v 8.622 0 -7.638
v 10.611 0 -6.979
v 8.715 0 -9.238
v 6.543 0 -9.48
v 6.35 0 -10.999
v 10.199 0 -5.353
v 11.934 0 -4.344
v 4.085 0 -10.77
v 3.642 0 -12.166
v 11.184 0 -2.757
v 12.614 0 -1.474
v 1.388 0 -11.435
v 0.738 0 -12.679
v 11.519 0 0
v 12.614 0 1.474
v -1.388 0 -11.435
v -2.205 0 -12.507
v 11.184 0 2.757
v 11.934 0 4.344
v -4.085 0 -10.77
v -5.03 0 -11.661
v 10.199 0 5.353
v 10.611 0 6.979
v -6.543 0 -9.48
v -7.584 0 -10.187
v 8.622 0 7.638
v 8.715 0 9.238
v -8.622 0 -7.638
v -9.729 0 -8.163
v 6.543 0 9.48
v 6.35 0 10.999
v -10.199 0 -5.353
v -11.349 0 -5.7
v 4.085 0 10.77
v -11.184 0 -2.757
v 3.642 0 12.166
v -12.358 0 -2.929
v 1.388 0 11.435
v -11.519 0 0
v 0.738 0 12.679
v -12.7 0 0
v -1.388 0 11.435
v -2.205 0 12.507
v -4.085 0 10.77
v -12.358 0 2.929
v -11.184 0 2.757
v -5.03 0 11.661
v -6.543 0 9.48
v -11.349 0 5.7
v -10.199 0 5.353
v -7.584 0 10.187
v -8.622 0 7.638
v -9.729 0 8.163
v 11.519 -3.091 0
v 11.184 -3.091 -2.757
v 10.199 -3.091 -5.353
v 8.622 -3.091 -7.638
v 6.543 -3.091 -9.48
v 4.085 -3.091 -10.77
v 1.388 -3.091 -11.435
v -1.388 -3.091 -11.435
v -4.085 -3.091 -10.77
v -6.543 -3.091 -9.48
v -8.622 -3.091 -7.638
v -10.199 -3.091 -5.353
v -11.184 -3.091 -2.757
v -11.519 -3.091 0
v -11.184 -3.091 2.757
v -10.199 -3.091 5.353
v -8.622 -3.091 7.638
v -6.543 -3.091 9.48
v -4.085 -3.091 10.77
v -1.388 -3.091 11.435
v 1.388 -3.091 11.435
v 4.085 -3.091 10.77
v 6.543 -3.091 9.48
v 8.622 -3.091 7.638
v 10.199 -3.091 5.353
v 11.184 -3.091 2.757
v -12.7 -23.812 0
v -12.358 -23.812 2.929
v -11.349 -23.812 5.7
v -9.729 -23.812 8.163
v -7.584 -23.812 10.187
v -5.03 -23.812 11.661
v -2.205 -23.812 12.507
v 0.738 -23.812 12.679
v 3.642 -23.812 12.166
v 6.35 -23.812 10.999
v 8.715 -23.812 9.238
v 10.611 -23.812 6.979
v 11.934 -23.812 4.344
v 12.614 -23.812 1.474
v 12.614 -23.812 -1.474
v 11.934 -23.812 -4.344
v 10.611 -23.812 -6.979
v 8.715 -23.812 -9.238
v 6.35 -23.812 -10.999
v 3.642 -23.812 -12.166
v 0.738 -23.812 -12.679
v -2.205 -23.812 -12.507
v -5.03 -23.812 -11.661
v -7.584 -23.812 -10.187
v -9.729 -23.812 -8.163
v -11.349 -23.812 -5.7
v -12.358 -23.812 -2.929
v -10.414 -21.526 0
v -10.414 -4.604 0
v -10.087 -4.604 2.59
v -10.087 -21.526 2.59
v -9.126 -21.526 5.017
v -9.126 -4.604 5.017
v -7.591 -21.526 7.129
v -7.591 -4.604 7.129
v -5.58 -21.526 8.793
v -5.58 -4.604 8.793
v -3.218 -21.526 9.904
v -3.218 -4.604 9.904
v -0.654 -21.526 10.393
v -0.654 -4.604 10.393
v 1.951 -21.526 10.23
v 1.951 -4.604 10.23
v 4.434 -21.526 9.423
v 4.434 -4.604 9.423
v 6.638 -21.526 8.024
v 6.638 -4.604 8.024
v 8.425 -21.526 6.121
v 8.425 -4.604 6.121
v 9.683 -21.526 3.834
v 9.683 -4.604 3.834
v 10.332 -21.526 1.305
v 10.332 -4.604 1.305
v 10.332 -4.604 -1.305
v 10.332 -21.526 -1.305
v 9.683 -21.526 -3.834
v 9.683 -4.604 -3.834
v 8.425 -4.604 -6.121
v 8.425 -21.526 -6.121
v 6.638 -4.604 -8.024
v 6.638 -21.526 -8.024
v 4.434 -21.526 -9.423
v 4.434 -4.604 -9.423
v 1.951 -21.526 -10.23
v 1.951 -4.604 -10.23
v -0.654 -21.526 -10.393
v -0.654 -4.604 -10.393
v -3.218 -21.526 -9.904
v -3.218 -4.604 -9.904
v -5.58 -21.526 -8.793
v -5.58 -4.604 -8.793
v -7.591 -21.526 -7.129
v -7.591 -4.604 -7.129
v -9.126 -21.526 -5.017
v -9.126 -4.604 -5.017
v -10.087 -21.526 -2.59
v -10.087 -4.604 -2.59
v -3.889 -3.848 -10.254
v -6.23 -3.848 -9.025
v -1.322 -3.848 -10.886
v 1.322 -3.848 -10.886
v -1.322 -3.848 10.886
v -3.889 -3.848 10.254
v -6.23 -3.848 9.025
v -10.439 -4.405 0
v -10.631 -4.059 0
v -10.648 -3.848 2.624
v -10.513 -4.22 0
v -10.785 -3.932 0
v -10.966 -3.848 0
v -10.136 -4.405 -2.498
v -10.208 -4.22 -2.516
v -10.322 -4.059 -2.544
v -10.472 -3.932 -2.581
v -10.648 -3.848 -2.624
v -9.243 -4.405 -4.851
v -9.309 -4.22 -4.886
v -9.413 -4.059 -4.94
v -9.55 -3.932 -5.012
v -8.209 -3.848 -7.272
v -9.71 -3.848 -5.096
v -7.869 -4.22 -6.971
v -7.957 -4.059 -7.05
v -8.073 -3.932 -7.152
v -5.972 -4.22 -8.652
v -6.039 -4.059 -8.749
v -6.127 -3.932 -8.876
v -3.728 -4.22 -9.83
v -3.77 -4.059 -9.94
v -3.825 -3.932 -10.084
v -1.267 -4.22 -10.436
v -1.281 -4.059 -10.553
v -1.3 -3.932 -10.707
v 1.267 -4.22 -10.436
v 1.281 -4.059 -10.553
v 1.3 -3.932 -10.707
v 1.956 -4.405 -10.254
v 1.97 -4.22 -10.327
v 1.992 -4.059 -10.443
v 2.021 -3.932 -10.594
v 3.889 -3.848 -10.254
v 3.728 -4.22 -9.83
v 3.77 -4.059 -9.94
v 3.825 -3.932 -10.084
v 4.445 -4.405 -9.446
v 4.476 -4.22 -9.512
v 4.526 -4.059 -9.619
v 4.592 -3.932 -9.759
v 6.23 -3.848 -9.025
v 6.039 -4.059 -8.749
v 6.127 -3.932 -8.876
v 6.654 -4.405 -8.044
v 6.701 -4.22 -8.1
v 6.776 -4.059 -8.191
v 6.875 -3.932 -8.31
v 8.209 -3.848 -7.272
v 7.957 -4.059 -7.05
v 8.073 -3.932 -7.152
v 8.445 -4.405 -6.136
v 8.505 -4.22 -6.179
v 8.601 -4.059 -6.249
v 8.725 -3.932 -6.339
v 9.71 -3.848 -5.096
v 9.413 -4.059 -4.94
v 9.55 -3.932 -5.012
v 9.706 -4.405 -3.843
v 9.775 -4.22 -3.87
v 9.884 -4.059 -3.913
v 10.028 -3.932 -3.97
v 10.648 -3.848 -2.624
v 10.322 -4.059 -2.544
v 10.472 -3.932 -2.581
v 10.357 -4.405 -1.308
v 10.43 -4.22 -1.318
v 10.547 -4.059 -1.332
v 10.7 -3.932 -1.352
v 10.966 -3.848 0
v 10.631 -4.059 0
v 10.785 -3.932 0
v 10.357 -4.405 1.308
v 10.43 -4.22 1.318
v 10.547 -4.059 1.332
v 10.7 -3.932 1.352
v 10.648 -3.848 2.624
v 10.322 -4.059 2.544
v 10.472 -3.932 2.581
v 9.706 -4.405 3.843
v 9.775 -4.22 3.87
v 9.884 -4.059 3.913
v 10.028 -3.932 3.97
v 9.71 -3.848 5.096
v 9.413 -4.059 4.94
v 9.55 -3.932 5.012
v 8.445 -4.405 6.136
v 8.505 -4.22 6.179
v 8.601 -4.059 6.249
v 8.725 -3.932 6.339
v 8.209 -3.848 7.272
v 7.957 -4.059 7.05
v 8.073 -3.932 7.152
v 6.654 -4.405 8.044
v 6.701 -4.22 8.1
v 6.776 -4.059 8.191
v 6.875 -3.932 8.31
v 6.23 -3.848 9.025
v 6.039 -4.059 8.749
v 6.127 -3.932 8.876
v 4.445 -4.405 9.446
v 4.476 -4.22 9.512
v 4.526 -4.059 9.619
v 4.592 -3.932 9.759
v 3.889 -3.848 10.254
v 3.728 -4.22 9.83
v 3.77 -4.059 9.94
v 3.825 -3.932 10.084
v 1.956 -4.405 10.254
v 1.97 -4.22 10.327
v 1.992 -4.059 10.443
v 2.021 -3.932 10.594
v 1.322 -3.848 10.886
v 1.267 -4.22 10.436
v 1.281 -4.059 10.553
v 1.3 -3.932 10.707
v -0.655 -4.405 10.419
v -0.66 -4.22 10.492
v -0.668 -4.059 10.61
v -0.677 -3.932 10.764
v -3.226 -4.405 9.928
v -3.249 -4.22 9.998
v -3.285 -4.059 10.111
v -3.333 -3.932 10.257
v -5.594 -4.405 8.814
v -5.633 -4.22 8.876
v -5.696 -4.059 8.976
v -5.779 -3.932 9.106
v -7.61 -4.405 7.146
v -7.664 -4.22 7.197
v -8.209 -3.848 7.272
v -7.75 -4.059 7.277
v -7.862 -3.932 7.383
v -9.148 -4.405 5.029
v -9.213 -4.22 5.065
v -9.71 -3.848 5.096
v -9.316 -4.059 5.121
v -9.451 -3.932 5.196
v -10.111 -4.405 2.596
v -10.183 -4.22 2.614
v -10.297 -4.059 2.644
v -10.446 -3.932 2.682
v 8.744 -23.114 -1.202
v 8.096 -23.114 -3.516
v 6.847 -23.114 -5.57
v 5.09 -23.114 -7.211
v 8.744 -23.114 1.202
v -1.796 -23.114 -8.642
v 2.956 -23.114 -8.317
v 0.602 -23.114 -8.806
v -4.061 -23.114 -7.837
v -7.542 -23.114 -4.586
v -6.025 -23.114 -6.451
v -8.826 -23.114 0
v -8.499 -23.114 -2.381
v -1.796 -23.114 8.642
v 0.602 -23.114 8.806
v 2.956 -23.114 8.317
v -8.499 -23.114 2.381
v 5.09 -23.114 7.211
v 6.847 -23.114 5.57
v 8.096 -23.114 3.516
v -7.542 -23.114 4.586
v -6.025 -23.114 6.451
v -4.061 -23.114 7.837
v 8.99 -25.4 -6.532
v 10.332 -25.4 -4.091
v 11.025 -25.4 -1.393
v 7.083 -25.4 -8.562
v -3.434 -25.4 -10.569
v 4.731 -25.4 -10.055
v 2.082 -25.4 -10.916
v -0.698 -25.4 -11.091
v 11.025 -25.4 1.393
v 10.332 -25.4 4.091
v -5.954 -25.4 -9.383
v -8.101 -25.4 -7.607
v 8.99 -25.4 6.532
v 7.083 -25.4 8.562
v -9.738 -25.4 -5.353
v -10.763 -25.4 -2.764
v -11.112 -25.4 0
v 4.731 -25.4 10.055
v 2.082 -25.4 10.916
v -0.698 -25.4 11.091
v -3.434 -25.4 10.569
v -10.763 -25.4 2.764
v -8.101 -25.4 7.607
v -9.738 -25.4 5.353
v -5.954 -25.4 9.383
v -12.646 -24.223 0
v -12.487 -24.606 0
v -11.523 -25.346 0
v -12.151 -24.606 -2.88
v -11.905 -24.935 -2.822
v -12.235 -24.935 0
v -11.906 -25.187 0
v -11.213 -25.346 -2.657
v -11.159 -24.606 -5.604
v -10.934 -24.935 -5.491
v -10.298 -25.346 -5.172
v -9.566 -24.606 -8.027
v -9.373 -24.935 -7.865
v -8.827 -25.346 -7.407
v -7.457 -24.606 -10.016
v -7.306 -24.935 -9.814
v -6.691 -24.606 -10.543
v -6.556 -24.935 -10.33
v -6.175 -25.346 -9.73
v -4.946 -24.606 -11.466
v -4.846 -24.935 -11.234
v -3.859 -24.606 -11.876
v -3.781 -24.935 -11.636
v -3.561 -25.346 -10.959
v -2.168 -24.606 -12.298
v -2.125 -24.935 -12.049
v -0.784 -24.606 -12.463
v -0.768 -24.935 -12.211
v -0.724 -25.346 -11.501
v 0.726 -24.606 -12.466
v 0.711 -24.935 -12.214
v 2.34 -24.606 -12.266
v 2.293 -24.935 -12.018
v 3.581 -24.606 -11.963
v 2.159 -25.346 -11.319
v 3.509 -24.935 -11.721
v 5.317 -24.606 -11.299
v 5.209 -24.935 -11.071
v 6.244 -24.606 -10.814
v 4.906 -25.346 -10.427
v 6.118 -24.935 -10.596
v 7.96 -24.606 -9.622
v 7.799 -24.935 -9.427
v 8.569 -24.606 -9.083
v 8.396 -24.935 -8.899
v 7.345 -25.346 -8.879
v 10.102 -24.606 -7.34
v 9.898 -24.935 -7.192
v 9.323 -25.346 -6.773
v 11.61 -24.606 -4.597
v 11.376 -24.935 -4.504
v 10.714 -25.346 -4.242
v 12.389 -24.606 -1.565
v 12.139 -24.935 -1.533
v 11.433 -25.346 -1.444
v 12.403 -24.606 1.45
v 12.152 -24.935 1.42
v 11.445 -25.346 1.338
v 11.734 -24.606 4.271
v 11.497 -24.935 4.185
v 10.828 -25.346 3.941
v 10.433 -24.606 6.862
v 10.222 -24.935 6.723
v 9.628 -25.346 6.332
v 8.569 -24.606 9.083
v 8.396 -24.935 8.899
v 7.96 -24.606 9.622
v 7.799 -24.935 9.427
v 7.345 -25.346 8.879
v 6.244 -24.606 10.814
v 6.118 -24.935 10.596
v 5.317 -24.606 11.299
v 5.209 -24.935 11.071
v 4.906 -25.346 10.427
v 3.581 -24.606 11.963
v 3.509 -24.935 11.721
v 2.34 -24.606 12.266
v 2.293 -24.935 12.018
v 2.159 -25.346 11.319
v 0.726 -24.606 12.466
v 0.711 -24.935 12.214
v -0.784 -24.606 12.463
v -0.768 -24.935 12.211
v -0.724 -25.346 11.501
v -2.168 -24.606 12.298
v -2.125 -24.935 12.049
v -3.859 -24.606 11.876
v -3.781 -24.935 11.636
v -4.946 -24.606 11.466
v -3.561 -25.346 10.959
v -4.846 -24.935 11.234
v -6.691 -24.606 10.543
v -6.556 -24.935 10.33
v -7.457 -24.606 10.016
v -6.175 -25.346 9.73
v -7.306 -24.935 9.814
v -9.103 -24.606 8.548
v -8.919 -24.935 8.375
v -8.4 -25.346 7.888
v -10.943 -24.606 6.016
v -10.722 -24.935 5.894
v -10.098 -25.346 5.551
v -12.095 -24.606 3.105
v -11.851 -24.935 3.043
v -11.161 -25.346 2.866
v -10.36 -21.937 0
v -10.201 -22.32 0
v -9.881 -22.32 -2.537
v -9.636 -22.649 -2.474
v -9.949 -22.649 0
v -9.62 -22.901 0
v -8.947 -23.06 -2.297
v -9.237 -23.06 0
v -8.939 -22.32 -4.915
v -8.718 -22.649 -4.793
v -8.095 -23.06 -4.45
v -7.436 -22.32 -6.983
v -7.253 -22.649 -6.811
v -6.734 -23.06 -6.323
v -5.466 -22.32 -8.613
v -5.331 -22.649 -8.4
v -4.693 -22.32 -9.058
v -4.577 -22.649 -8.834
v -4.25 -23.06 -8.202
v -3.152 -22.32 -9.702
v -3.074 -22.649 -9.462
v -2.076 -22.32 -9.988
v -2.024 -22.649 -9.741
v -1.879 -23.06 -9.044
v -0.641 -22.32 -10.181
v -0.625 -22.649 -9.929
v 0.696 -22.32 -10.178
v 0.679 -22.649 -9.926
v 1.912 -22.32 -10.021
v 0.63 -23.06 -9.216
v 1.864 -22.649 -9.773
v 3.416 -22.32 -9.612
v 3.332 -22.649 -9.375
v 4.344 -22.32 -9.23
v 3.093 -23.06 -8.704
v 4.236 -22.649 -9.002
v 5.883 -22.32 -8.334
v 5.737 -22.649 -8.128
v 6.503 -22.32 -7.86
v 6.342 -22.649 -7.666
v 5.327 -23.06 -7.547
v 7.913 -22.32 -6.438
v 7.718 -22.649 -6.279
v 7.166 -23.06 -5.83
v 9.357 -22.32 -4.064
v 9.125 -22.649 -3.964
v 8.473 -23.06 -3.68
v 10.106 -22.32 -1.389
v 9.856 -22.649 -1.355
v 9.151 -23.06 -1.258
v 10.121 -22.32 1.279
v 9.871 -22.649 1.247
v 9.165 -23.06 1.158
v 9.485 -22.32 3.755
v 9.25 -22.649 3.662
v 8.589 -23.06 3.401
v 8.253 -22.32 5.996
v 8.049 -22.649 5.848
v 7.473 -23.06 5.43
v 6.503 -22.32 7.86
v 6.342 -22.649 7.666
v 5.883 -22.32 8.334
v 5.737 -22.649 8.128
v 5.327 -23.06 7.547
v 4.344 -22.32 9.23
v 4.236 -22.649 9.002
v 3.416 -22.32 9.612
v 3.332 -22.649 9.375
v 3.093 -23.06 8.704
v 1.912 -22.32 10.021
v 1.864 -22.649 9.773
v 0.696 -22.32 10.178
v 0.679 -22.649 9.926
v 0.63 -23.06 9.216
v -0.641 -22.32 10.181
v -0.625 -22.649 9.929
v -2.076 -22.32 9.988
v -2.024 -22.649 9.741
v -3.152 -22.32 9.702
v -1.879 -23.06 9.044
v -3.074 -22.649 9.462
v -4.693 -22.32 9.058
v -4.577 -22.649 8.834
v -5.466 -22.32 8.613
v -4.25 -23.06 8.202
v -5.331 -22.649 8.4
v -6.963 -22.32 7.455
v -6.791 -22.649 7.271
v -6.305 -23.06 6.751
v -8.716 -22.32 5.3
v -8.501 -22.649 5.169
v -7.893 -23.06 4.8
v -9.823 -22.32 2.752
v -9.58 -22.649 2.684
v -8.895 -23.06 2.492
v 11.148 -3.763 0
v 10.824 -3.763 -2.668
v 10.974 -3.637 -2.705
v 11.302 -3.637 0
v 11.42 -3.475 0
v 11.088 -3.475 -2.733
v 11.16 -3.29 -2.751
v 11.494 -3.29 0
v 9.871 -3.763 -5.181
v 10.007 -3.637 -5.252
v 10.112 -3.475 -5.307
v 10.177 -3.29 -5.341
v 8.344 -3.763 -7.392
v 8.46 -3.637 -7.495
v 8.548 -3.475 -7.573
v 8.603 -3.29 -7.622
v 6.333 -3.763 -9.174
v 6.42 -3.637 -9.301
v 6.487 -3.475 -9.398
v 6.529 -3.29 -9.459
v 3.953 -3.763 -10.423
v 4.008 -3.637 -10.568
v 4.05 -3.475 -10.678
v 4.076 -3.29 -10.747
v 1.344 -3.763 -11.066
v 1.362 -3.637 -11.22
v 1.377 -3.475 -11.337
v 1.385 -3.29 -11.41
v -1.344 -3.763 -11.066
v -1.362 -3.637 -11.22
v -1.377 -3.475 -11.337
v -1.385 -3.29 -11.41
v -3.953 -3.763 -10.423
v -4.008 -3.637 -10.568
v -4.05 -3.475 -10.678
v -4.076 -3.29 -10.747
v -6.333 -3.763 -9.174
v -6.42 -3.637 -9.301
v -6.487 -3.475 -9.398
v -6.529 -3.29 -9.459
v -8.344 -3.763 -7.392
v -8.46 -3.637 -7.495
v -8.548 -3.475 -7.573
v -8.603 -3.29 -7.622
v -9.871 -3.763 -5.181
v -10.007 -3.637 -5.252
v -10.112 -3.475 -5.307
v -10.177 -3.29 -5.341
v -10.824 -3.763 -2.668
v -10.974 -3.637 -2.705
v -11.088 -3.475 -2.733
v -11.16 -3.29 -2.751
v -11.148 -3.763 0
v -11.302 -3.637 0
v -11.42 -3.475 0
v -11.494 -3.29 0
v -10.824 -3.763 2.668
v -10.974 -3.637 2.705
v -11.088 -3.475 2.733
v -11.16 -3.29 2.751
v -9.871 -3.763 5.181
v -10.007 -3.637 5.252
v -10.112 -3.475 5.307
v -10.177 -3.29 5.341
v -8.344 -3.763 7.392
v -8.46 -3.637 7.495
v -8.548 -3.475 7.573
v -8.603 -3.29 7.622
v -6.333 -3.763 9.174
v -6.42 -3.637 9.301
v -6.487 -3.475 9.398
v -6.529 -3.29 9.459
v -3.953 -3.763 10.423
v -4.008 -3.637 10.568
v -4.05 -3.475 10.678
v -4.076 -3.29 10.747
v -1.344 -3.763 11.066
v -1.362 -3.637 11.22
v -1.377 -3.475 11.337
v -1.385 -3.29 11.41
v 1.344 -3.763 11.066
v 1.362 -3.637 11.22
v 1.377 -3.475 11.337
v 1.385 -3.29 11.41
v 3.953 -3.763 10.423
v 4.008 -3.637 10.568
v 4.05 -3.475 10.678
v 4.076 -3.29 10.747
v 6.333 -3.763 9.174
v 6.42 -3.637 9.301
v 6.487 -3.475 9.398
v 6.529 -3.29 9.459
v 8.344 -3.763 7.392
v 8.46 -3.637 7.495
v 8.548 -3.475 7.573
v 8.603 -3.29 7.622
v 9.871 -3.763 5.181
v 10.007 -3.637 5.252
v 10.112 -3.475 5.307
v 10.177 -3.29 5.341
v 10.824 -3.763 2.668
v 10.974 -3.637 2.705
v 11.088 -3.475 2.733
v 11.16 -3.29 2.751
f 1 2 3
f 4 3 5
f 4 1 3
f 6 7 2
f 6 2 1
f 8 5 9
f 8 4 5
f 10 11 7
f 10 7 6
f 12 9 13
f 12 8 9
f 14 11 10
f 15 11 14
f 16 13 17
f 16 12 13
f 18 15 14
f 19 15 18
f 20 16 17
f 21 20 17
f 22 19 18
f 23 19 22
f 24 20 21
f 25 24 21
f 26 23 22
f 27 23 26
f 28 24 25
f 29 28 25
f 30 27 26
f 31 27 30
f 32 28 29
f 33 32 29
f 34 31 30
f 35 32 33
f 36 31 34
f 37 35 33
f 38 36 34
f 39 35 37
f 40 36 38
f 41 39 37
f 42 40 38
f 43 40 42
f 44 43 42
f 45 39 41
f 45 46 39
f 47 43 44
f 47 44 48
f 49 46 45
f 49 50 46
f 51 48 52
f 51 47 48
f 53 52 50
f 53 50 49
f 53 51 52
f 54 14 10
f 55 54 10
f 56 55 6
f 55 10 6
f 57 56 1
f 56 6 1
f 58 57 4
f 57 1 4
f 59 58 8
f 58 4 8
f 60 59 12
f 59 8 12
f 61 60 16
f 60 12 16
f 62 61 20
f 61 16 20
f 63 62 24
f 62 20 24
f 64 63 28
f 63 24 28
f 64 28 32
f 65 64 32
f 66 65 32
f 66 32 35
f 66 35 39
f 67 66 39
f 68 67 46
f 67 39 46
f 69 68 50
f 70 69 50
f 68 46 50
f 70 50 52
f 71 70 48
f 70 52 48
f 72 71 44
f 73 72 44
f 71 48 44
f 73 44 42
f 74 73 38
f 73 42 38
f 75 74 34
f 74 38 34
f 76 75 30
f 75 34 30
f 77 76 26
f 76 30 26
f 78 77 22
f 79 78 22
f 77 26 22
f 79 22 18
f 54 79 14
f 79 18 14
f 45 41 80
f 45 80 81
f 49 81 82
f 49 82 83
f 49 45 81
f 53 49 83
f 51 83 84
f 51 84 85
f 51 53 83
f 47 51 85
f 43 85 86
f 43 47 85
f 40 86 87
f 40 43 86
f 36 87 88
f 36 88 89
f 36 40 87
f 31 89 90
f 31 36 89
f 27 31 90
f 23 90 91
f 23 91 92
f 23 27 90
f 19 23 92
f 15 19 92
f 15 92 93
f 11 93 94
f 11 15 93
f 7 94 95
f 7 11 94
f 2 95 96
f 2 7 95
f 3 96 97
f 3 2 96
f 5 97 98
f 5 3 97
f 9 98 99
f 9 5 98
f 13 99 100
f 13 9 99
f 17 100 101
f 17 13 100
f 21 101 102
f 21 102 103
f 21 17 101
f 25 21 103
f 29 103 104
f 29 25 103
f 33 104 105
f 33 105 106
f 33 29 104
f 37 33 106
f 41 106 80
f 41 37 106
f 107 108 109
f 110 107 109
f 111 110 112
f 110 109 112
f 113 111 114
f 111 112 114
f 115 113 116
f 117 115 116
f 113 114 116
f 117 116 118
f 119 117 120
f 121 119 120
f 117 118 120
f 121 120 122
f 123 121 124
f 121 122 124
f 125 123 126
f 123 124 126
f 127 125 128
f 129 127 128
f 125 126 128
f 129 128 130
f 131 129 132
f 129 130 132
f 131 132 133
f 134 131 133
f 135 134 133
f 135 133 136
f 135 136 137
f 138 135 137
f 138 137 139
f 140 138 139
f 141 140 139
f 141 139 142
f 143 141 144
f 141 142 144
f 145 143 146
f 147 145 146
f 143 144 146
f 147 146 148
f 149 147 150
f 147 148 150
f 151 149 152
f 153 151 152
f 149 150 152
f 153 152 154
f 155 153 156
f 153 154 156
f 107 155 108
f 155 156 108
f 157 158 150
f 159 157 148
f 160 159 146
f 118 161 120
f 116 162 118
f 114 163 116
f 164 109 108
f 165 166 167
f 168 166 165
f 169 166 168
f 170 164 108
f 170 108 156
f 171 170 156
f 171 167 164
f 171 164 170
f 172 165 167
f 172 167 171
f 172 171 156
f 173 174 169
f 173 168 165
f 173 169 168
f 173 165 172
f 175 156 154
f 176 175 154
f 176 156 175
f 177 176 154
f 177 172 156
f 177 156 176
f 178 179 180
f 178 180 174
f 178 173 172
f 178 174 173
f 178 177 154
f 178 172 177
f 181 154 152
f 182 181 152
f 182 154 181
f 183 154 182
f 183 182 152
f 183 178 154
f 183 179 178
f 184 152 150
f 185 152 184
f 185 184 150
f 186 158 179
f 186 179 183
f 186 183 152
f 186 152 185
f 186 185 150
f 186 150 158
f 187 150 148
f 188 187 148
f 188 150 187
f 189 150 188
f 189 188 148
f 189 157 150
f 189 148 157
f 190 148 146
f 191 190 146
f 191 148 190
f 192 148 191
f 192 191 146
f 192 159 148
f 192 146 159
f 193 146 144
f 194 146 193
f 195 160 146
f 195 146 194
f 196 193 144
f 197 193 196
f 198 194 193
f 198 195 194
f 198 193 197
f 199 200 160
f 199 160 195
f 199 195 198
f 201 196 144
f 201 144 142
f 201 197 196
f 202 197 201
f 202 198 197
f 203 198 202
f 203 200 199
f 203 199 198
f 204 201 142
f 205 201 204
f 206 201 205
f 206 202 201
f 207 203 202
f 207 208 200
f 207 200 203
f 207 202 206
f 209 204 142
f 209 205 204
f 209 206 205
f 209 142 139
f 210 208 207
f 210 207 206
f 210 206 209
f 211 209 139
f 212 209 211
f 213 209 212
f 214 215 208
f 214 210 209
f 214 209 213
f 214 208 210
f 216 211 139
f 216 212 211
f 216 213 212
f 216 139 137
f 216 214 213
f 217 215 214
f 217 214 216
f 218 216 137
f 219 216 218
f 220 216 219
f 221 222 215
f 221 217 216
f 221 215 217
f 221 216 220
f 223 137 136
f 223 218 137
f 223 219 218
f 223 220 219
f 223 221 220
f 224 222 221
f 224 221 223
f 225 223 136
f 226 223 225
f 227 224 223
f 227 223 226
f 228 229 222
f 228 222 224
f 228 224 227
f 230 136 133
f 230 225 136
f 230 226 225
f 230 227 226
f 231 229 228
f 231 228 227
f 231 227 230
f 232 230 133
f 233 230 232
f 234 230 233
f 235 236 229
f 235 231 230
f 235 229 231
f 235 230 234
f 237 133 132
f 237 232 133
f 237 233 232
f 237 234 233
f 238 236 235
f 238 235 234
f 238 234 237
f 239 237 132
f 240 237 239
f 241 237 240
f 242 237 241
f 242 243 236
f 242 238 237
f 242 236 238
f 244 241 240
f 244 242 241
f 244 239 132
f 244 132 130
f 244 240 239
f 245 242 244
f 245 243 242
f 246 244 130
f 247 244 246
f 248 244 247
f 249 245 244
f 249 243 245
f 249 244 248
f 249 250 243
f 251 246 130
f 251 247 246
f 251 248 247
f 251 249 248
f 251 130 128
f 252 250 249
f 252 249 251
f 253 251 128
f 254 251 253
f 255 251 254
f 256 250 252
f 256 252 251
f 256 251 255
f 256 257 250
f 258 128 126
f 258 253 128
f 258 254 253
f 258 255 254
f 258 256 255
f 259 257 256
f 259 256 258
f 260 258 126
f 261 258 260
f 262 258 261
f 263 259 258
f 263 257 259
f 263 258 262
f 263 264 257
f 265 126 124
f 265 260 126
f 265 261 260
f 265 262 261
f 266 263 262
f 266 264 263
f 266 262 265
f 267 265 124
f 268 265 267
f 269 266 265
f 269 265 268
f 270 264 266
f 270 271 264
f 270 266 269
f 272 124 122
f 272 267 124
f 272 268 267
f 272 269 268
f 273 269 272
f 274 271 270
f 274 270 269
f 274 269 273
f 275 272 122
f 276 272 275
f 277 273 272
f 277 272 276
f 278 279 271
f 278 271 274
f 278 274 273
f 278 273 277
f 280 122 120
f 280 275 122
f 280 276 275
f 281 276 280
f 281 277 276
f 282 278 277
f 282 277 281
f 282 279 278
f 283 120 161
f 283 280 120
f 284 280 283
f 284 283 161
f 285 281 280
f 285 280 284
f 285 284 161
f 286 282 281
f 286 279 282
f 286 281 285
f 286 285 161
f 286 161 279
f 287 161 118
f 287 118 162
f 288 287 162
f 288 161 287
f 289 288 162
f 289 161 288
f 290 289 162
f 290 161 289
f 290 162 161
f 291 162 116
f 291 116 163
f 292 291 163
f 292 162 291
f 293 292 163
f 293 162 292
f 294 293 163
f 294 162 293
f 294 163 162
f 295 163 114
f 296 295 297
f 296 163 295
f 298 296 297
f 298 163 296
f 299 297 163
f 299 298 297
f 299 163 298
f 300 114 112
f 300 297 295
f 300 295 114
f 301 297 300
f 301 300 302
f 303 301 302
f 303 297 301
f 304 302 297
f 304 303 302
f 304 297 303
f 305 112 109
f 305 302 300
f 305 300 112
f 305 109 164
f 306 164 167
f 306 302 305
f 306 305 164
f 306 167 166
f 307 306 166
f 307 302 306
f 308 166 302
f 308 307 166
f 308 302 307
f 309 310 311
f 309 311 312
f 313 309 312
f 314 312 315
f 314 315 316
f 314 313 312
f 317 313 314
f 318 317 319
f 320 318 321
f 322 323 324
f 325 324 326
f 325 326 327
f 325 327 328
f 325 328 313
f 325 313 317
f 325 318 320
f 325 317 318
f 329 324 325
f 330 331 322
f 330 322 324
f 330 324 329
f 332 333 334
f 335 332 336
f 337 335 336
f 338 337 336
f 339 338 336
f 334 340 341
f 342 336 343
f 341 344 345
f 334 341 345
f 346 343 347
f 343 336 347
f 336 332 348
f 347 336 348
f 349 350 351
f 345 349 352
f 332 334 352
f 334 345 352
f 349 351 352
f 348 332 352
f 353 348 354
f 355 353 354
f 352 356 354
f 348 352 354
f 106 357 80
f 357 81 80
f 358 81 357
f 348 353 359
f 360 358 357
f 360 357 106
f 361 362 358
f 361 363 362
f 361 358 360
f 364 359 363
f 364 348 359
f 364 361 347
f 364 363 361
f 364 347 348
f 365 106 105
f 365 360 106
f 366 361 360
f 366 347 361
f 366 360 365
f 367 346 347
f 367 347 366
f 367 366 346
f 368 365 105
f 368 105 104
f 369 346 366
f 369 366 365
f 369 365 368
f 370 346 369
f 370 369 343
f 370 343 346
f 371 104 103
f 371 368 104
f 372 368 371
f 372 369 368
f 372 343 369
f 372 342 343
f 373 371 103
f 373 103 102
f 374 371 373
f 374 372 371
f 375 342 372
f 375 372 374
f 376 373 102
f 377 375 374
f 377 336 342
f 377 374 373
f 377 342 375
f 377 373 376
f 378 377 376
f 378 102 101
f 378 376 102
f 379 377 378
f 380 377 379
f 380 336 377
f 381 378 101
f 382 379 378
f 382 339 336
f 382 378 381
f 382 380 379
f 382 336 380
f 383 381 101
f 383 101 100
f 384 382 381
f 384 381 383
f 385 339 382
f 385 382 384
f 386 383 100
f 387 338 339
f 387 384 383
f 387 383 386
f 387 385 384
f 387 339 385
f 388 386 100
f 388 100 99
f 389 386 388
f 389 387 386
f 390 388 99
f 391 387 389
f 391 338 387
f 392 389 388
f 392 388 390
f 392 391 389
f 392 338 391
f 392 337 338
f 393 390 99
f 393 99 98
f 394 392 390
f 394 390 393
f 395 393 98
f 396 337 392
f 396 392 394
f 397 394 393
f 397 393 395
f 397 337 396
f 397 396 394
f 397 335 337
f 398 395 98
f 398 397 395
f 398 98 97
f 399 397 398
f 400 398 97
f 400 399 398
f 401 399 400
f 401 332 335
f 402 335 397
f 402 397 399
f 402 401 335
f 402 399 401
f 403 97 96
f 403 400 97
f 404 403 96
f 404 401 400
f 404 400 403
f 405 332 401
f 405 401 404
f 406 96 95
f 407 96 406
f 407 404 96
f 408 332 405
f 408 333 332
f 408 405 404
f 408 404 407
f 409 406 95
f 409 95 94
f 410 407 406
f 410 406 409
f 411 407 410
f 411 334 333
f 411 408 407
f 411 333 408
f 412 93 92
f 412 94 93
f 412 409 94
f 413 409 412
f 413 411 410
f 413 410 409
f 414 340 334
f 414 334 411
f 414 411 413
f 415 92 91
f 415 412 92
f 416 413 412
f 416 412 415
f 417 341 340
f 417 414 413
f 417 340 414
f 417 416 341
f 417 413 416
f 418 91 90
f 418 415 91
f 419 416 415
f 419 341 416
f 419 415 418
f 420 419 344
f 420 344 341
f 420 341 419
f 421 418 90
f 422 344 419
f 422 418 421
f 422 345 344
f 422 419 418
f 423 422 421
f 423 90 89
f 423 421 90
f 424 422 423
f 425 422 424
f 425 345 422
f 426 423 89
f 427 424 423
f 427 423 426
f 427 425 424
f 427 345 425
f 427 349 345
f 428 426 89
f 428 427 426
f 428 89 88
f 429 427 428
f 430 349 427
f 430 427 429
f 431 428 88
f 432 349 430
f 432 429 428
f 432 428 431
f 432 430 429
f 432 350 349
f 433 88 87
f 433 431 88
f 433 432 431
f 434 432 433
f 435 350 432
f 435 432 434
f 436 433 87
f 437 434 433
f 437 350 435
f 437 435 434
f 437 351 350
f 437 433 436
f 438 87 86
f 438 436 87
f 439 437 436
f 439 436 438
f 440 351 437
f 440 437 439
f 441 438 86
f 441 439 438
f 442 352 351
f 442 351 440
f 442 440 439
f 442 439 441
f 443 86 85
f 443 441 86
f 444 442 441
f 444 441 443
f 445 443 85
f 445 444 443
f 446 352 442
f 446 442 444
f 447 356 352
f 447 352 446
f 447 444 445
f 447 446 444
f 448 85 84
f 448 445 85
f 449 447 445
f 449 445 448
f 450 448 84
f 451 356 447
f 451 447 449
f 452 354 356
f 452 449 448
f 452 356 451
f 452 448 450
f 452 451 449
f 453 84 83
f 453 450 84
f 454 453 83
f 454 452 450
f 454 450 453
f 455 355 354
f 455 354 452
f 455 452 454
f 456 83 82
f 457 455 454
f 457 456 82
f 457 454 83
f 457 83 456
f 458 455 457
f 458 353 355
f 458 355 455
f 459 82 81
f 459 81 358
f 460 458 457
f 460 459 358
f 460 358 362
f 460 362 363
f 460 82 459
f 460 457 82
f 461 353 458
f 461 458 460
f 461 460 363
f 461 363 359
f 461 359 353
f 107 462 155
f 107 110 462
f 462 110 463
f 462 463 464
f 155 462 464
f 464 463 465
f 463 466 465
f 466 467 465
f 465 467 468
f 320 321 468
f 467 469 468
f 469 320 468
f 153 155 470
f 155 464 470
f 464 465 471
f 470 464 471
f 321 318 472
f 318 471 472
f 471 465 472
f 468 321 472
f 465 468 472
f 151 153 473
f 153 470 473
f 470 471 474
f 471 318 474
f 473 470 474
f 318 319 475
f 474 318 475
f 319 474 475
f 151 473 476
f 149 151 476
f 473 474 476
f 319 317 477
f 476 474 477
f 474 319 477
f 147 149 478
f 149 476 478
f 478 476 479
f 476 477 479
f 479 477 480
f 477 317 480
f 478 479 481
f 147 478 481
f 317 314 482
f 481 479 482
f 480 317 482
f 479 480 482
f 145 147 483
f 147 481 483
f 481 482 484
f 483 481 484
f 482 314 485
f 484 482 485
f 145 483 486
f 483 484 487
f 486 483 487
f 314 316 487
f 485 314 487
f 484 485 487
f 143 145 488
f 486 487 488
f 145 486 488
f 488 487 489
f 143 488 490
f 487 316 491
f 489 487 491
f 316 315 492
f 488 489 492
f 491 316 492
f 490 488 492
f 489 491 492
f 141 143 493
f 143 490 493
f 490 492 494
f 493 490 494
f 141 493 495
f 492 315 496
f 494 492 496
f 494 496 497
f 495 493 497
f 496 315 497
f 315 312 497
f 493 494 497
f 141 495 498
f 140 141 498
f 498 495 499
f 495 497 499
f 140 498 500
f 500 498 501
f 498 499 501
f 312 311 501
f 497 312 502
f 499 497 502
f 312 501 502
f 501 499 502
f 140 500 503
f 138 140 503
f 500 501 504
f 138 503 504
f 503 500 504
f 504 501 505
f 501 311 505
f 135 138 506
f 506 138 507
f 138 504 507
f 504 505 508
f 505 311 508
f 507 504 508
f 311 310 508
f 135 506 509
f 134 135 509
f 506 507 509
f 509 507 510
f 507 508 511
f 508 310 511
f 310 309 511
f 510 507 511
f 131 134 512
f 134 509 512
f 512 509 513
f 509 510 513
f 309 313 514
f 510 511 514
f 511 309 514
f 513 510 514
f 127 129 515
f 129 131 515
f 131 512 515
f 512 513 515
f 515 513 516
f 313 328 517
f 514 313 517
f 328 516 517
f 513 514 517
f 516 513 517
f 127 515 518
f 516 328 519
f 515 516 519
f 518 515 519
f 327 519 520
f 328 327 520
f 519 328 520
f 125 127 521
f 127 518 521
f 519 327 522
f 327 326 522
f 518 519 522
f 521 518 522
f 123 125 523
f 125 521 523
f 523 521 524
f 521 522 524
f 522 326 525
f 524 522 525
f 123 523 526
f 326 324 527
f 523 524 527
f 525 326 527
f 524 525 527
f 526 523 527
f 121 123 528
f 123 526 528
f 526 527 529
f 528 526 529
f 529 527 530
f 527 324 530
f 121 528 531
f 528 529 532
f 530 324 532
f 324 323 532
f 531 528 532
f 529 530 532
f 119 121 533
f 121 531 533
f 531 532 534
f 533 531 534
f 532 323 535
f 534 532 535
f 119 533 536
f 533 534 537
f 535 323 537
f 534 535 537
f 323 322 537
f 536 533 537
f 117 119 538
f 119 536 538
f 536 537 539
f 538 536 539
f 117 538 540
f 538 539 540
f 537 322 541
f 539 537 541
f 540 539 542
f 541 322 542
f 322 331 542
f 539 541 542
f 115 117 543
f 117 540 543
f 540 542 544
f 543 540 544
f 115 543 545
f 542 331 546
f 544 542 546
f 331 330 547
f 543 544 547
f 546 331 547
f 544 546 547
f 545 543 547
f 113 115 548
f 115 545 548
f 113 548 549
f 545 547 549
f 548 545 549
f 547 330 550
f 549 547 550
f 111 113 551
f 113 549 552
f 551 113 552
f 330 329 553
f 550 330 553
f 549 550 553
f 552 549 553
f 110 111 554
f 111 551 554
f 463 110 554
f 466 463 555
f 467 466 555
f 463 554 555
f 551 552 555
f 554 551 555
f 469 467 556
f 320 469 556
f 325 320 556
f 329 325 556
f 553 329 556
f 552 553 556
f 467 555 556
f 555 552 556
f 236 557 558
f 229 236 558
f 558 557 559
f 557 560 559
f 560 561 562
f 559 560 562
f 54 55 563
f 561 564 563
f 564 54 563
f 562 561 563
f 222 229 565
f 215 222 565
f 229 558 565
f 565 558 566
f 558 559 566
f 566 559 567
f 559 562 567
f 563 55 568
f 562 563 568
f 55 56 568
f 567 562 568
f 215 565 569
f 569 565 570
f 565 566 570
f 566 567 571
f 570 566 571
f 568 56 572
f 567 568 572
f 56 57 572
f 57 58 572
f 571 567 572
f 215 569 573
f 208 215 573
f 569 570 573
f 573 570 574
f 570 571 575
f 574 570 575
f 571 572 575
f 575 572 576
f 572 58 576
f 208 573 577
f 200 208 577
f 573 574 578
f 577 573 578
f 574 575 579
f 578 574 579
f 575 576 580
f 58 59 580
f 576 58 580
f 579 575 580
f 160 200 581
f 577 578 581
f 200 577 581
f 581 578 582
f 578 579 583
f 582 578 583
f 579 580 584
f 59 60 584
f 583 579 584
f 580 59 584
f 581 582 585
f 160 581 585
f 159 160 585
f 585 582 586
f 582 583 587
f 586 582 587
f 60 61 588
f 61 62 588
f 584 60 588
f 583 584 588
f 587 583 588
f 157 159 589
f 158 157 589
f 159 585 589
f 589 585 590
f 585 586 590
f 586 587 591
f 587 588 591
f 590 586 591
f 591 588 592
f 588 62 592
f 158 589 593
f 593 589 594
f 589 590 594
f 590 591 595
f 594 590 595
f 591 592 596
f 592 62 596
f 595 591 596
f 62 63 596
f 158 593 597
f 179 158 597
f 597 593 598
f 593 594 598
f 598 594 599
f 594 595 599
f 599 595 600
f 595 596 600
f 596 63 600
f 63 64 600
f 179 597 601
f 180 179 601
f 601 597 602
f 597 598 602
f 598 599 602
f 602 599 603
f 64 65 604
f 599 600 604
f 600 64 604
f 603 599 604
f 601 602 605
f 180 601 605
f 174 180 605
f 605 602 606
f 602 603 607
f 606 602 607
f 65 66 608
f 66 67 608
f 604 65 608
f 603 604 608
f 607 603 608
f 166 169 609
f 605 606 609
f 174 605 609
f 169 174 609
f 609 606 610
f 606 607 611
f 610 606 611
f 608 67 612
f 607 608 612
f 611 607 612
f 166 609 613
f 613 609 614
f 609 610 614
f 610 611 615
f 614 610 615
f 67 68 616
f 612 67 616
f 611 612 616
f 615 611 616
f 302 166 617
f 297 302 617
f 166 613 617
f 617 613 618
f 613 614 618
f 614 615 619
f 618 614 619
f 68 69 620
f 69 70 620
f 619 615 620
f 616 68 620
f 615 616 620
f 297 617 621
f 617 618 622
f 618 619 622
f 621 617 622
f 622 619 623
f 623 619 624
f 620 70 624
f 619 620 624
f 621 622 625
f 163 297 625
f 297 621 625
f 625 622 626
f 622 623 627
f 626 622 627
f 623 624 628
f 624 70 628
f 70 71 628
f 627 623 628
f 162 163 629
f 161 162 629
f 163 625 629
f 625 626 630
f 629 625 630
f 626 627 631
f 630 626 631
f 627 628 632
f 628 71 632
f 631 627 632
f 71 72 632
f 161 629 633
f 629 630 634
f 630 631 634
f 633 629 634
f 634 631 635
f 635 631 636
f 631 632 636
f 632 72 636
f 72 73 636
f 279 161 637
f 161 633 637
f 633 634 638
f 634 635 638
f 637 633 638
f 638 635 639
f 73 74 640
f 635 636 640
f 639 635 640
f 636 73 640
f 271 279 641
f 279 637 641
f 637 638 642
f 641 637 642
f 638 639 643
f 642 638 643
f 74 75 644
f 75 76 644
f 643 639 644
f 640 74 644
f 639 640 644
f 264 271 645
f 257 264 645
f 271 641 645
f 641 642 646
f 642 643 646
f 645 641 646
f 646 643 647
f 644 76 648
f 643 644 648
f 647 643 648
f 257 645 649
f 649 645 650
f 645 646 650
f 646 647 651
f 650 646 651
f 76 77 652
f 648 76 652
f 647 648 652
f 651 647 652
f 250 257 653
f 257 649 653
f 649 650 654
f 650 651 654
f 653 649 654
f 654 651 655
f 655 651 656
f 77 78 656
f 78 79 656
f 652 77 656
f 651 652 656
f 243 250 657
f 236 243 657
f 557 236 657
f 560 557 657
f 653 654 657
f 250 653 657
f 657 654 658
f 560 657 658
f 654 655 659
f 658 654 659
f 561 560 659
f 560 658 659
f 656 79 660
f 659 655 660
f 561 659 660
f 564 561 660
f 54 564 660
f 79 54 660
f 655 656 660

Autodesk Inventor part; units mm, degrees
ref_plane "YZ Plane" through (0, 0, 0) normal (1, 0, 0) x (0, 1, 0)
ref_plane "XZ Plane" through (0, 0, 0) normal (0, 1, 0) x (-1, 0, 0)
ref_plane "XY Plane" through (0, 0, 0) normal (0, 0, 1) x (1, 0, 0)
sketch "Sketch1" plane through (0, 0, 0) normal (0, 1, 0) x (-1, 0, 0)
  circle A0 centre (0, 0) radius 12.7
  dimension "d1" = 25.4
extrude "Extrusion1" add sketch "Sketch1" against normal blind 25.4
shell "Shell1" thickness 2.286 removed faces 1 at (-0.1664, 0, 2.8072)
sketch "Sketch2" plane through (0, 0, 0) normal (0, 1, 0) x (1, 0, 0)
  circle A0 centre (0, 0) radius 11.5189
  dimension "d5" = 23.0378
extrude "Extrusion2" cut sketch "Sketch2" against normal blind 3.81
fillet "Fillet1" radius 1.5875 1 edges at (12.7, -25.4, 0)
fillet "Fillet2" radius 1.5875 1 edges at (10.414, -23.114, 0)
fillet "Fillet3" radius 0.7937 1 edges at (10.414, -3.81, 0)
fillet "Fillet4" radius 0.7937 1 edges at (-11.5189, -3.81, 0)
properties part number "Bolt Cap"
